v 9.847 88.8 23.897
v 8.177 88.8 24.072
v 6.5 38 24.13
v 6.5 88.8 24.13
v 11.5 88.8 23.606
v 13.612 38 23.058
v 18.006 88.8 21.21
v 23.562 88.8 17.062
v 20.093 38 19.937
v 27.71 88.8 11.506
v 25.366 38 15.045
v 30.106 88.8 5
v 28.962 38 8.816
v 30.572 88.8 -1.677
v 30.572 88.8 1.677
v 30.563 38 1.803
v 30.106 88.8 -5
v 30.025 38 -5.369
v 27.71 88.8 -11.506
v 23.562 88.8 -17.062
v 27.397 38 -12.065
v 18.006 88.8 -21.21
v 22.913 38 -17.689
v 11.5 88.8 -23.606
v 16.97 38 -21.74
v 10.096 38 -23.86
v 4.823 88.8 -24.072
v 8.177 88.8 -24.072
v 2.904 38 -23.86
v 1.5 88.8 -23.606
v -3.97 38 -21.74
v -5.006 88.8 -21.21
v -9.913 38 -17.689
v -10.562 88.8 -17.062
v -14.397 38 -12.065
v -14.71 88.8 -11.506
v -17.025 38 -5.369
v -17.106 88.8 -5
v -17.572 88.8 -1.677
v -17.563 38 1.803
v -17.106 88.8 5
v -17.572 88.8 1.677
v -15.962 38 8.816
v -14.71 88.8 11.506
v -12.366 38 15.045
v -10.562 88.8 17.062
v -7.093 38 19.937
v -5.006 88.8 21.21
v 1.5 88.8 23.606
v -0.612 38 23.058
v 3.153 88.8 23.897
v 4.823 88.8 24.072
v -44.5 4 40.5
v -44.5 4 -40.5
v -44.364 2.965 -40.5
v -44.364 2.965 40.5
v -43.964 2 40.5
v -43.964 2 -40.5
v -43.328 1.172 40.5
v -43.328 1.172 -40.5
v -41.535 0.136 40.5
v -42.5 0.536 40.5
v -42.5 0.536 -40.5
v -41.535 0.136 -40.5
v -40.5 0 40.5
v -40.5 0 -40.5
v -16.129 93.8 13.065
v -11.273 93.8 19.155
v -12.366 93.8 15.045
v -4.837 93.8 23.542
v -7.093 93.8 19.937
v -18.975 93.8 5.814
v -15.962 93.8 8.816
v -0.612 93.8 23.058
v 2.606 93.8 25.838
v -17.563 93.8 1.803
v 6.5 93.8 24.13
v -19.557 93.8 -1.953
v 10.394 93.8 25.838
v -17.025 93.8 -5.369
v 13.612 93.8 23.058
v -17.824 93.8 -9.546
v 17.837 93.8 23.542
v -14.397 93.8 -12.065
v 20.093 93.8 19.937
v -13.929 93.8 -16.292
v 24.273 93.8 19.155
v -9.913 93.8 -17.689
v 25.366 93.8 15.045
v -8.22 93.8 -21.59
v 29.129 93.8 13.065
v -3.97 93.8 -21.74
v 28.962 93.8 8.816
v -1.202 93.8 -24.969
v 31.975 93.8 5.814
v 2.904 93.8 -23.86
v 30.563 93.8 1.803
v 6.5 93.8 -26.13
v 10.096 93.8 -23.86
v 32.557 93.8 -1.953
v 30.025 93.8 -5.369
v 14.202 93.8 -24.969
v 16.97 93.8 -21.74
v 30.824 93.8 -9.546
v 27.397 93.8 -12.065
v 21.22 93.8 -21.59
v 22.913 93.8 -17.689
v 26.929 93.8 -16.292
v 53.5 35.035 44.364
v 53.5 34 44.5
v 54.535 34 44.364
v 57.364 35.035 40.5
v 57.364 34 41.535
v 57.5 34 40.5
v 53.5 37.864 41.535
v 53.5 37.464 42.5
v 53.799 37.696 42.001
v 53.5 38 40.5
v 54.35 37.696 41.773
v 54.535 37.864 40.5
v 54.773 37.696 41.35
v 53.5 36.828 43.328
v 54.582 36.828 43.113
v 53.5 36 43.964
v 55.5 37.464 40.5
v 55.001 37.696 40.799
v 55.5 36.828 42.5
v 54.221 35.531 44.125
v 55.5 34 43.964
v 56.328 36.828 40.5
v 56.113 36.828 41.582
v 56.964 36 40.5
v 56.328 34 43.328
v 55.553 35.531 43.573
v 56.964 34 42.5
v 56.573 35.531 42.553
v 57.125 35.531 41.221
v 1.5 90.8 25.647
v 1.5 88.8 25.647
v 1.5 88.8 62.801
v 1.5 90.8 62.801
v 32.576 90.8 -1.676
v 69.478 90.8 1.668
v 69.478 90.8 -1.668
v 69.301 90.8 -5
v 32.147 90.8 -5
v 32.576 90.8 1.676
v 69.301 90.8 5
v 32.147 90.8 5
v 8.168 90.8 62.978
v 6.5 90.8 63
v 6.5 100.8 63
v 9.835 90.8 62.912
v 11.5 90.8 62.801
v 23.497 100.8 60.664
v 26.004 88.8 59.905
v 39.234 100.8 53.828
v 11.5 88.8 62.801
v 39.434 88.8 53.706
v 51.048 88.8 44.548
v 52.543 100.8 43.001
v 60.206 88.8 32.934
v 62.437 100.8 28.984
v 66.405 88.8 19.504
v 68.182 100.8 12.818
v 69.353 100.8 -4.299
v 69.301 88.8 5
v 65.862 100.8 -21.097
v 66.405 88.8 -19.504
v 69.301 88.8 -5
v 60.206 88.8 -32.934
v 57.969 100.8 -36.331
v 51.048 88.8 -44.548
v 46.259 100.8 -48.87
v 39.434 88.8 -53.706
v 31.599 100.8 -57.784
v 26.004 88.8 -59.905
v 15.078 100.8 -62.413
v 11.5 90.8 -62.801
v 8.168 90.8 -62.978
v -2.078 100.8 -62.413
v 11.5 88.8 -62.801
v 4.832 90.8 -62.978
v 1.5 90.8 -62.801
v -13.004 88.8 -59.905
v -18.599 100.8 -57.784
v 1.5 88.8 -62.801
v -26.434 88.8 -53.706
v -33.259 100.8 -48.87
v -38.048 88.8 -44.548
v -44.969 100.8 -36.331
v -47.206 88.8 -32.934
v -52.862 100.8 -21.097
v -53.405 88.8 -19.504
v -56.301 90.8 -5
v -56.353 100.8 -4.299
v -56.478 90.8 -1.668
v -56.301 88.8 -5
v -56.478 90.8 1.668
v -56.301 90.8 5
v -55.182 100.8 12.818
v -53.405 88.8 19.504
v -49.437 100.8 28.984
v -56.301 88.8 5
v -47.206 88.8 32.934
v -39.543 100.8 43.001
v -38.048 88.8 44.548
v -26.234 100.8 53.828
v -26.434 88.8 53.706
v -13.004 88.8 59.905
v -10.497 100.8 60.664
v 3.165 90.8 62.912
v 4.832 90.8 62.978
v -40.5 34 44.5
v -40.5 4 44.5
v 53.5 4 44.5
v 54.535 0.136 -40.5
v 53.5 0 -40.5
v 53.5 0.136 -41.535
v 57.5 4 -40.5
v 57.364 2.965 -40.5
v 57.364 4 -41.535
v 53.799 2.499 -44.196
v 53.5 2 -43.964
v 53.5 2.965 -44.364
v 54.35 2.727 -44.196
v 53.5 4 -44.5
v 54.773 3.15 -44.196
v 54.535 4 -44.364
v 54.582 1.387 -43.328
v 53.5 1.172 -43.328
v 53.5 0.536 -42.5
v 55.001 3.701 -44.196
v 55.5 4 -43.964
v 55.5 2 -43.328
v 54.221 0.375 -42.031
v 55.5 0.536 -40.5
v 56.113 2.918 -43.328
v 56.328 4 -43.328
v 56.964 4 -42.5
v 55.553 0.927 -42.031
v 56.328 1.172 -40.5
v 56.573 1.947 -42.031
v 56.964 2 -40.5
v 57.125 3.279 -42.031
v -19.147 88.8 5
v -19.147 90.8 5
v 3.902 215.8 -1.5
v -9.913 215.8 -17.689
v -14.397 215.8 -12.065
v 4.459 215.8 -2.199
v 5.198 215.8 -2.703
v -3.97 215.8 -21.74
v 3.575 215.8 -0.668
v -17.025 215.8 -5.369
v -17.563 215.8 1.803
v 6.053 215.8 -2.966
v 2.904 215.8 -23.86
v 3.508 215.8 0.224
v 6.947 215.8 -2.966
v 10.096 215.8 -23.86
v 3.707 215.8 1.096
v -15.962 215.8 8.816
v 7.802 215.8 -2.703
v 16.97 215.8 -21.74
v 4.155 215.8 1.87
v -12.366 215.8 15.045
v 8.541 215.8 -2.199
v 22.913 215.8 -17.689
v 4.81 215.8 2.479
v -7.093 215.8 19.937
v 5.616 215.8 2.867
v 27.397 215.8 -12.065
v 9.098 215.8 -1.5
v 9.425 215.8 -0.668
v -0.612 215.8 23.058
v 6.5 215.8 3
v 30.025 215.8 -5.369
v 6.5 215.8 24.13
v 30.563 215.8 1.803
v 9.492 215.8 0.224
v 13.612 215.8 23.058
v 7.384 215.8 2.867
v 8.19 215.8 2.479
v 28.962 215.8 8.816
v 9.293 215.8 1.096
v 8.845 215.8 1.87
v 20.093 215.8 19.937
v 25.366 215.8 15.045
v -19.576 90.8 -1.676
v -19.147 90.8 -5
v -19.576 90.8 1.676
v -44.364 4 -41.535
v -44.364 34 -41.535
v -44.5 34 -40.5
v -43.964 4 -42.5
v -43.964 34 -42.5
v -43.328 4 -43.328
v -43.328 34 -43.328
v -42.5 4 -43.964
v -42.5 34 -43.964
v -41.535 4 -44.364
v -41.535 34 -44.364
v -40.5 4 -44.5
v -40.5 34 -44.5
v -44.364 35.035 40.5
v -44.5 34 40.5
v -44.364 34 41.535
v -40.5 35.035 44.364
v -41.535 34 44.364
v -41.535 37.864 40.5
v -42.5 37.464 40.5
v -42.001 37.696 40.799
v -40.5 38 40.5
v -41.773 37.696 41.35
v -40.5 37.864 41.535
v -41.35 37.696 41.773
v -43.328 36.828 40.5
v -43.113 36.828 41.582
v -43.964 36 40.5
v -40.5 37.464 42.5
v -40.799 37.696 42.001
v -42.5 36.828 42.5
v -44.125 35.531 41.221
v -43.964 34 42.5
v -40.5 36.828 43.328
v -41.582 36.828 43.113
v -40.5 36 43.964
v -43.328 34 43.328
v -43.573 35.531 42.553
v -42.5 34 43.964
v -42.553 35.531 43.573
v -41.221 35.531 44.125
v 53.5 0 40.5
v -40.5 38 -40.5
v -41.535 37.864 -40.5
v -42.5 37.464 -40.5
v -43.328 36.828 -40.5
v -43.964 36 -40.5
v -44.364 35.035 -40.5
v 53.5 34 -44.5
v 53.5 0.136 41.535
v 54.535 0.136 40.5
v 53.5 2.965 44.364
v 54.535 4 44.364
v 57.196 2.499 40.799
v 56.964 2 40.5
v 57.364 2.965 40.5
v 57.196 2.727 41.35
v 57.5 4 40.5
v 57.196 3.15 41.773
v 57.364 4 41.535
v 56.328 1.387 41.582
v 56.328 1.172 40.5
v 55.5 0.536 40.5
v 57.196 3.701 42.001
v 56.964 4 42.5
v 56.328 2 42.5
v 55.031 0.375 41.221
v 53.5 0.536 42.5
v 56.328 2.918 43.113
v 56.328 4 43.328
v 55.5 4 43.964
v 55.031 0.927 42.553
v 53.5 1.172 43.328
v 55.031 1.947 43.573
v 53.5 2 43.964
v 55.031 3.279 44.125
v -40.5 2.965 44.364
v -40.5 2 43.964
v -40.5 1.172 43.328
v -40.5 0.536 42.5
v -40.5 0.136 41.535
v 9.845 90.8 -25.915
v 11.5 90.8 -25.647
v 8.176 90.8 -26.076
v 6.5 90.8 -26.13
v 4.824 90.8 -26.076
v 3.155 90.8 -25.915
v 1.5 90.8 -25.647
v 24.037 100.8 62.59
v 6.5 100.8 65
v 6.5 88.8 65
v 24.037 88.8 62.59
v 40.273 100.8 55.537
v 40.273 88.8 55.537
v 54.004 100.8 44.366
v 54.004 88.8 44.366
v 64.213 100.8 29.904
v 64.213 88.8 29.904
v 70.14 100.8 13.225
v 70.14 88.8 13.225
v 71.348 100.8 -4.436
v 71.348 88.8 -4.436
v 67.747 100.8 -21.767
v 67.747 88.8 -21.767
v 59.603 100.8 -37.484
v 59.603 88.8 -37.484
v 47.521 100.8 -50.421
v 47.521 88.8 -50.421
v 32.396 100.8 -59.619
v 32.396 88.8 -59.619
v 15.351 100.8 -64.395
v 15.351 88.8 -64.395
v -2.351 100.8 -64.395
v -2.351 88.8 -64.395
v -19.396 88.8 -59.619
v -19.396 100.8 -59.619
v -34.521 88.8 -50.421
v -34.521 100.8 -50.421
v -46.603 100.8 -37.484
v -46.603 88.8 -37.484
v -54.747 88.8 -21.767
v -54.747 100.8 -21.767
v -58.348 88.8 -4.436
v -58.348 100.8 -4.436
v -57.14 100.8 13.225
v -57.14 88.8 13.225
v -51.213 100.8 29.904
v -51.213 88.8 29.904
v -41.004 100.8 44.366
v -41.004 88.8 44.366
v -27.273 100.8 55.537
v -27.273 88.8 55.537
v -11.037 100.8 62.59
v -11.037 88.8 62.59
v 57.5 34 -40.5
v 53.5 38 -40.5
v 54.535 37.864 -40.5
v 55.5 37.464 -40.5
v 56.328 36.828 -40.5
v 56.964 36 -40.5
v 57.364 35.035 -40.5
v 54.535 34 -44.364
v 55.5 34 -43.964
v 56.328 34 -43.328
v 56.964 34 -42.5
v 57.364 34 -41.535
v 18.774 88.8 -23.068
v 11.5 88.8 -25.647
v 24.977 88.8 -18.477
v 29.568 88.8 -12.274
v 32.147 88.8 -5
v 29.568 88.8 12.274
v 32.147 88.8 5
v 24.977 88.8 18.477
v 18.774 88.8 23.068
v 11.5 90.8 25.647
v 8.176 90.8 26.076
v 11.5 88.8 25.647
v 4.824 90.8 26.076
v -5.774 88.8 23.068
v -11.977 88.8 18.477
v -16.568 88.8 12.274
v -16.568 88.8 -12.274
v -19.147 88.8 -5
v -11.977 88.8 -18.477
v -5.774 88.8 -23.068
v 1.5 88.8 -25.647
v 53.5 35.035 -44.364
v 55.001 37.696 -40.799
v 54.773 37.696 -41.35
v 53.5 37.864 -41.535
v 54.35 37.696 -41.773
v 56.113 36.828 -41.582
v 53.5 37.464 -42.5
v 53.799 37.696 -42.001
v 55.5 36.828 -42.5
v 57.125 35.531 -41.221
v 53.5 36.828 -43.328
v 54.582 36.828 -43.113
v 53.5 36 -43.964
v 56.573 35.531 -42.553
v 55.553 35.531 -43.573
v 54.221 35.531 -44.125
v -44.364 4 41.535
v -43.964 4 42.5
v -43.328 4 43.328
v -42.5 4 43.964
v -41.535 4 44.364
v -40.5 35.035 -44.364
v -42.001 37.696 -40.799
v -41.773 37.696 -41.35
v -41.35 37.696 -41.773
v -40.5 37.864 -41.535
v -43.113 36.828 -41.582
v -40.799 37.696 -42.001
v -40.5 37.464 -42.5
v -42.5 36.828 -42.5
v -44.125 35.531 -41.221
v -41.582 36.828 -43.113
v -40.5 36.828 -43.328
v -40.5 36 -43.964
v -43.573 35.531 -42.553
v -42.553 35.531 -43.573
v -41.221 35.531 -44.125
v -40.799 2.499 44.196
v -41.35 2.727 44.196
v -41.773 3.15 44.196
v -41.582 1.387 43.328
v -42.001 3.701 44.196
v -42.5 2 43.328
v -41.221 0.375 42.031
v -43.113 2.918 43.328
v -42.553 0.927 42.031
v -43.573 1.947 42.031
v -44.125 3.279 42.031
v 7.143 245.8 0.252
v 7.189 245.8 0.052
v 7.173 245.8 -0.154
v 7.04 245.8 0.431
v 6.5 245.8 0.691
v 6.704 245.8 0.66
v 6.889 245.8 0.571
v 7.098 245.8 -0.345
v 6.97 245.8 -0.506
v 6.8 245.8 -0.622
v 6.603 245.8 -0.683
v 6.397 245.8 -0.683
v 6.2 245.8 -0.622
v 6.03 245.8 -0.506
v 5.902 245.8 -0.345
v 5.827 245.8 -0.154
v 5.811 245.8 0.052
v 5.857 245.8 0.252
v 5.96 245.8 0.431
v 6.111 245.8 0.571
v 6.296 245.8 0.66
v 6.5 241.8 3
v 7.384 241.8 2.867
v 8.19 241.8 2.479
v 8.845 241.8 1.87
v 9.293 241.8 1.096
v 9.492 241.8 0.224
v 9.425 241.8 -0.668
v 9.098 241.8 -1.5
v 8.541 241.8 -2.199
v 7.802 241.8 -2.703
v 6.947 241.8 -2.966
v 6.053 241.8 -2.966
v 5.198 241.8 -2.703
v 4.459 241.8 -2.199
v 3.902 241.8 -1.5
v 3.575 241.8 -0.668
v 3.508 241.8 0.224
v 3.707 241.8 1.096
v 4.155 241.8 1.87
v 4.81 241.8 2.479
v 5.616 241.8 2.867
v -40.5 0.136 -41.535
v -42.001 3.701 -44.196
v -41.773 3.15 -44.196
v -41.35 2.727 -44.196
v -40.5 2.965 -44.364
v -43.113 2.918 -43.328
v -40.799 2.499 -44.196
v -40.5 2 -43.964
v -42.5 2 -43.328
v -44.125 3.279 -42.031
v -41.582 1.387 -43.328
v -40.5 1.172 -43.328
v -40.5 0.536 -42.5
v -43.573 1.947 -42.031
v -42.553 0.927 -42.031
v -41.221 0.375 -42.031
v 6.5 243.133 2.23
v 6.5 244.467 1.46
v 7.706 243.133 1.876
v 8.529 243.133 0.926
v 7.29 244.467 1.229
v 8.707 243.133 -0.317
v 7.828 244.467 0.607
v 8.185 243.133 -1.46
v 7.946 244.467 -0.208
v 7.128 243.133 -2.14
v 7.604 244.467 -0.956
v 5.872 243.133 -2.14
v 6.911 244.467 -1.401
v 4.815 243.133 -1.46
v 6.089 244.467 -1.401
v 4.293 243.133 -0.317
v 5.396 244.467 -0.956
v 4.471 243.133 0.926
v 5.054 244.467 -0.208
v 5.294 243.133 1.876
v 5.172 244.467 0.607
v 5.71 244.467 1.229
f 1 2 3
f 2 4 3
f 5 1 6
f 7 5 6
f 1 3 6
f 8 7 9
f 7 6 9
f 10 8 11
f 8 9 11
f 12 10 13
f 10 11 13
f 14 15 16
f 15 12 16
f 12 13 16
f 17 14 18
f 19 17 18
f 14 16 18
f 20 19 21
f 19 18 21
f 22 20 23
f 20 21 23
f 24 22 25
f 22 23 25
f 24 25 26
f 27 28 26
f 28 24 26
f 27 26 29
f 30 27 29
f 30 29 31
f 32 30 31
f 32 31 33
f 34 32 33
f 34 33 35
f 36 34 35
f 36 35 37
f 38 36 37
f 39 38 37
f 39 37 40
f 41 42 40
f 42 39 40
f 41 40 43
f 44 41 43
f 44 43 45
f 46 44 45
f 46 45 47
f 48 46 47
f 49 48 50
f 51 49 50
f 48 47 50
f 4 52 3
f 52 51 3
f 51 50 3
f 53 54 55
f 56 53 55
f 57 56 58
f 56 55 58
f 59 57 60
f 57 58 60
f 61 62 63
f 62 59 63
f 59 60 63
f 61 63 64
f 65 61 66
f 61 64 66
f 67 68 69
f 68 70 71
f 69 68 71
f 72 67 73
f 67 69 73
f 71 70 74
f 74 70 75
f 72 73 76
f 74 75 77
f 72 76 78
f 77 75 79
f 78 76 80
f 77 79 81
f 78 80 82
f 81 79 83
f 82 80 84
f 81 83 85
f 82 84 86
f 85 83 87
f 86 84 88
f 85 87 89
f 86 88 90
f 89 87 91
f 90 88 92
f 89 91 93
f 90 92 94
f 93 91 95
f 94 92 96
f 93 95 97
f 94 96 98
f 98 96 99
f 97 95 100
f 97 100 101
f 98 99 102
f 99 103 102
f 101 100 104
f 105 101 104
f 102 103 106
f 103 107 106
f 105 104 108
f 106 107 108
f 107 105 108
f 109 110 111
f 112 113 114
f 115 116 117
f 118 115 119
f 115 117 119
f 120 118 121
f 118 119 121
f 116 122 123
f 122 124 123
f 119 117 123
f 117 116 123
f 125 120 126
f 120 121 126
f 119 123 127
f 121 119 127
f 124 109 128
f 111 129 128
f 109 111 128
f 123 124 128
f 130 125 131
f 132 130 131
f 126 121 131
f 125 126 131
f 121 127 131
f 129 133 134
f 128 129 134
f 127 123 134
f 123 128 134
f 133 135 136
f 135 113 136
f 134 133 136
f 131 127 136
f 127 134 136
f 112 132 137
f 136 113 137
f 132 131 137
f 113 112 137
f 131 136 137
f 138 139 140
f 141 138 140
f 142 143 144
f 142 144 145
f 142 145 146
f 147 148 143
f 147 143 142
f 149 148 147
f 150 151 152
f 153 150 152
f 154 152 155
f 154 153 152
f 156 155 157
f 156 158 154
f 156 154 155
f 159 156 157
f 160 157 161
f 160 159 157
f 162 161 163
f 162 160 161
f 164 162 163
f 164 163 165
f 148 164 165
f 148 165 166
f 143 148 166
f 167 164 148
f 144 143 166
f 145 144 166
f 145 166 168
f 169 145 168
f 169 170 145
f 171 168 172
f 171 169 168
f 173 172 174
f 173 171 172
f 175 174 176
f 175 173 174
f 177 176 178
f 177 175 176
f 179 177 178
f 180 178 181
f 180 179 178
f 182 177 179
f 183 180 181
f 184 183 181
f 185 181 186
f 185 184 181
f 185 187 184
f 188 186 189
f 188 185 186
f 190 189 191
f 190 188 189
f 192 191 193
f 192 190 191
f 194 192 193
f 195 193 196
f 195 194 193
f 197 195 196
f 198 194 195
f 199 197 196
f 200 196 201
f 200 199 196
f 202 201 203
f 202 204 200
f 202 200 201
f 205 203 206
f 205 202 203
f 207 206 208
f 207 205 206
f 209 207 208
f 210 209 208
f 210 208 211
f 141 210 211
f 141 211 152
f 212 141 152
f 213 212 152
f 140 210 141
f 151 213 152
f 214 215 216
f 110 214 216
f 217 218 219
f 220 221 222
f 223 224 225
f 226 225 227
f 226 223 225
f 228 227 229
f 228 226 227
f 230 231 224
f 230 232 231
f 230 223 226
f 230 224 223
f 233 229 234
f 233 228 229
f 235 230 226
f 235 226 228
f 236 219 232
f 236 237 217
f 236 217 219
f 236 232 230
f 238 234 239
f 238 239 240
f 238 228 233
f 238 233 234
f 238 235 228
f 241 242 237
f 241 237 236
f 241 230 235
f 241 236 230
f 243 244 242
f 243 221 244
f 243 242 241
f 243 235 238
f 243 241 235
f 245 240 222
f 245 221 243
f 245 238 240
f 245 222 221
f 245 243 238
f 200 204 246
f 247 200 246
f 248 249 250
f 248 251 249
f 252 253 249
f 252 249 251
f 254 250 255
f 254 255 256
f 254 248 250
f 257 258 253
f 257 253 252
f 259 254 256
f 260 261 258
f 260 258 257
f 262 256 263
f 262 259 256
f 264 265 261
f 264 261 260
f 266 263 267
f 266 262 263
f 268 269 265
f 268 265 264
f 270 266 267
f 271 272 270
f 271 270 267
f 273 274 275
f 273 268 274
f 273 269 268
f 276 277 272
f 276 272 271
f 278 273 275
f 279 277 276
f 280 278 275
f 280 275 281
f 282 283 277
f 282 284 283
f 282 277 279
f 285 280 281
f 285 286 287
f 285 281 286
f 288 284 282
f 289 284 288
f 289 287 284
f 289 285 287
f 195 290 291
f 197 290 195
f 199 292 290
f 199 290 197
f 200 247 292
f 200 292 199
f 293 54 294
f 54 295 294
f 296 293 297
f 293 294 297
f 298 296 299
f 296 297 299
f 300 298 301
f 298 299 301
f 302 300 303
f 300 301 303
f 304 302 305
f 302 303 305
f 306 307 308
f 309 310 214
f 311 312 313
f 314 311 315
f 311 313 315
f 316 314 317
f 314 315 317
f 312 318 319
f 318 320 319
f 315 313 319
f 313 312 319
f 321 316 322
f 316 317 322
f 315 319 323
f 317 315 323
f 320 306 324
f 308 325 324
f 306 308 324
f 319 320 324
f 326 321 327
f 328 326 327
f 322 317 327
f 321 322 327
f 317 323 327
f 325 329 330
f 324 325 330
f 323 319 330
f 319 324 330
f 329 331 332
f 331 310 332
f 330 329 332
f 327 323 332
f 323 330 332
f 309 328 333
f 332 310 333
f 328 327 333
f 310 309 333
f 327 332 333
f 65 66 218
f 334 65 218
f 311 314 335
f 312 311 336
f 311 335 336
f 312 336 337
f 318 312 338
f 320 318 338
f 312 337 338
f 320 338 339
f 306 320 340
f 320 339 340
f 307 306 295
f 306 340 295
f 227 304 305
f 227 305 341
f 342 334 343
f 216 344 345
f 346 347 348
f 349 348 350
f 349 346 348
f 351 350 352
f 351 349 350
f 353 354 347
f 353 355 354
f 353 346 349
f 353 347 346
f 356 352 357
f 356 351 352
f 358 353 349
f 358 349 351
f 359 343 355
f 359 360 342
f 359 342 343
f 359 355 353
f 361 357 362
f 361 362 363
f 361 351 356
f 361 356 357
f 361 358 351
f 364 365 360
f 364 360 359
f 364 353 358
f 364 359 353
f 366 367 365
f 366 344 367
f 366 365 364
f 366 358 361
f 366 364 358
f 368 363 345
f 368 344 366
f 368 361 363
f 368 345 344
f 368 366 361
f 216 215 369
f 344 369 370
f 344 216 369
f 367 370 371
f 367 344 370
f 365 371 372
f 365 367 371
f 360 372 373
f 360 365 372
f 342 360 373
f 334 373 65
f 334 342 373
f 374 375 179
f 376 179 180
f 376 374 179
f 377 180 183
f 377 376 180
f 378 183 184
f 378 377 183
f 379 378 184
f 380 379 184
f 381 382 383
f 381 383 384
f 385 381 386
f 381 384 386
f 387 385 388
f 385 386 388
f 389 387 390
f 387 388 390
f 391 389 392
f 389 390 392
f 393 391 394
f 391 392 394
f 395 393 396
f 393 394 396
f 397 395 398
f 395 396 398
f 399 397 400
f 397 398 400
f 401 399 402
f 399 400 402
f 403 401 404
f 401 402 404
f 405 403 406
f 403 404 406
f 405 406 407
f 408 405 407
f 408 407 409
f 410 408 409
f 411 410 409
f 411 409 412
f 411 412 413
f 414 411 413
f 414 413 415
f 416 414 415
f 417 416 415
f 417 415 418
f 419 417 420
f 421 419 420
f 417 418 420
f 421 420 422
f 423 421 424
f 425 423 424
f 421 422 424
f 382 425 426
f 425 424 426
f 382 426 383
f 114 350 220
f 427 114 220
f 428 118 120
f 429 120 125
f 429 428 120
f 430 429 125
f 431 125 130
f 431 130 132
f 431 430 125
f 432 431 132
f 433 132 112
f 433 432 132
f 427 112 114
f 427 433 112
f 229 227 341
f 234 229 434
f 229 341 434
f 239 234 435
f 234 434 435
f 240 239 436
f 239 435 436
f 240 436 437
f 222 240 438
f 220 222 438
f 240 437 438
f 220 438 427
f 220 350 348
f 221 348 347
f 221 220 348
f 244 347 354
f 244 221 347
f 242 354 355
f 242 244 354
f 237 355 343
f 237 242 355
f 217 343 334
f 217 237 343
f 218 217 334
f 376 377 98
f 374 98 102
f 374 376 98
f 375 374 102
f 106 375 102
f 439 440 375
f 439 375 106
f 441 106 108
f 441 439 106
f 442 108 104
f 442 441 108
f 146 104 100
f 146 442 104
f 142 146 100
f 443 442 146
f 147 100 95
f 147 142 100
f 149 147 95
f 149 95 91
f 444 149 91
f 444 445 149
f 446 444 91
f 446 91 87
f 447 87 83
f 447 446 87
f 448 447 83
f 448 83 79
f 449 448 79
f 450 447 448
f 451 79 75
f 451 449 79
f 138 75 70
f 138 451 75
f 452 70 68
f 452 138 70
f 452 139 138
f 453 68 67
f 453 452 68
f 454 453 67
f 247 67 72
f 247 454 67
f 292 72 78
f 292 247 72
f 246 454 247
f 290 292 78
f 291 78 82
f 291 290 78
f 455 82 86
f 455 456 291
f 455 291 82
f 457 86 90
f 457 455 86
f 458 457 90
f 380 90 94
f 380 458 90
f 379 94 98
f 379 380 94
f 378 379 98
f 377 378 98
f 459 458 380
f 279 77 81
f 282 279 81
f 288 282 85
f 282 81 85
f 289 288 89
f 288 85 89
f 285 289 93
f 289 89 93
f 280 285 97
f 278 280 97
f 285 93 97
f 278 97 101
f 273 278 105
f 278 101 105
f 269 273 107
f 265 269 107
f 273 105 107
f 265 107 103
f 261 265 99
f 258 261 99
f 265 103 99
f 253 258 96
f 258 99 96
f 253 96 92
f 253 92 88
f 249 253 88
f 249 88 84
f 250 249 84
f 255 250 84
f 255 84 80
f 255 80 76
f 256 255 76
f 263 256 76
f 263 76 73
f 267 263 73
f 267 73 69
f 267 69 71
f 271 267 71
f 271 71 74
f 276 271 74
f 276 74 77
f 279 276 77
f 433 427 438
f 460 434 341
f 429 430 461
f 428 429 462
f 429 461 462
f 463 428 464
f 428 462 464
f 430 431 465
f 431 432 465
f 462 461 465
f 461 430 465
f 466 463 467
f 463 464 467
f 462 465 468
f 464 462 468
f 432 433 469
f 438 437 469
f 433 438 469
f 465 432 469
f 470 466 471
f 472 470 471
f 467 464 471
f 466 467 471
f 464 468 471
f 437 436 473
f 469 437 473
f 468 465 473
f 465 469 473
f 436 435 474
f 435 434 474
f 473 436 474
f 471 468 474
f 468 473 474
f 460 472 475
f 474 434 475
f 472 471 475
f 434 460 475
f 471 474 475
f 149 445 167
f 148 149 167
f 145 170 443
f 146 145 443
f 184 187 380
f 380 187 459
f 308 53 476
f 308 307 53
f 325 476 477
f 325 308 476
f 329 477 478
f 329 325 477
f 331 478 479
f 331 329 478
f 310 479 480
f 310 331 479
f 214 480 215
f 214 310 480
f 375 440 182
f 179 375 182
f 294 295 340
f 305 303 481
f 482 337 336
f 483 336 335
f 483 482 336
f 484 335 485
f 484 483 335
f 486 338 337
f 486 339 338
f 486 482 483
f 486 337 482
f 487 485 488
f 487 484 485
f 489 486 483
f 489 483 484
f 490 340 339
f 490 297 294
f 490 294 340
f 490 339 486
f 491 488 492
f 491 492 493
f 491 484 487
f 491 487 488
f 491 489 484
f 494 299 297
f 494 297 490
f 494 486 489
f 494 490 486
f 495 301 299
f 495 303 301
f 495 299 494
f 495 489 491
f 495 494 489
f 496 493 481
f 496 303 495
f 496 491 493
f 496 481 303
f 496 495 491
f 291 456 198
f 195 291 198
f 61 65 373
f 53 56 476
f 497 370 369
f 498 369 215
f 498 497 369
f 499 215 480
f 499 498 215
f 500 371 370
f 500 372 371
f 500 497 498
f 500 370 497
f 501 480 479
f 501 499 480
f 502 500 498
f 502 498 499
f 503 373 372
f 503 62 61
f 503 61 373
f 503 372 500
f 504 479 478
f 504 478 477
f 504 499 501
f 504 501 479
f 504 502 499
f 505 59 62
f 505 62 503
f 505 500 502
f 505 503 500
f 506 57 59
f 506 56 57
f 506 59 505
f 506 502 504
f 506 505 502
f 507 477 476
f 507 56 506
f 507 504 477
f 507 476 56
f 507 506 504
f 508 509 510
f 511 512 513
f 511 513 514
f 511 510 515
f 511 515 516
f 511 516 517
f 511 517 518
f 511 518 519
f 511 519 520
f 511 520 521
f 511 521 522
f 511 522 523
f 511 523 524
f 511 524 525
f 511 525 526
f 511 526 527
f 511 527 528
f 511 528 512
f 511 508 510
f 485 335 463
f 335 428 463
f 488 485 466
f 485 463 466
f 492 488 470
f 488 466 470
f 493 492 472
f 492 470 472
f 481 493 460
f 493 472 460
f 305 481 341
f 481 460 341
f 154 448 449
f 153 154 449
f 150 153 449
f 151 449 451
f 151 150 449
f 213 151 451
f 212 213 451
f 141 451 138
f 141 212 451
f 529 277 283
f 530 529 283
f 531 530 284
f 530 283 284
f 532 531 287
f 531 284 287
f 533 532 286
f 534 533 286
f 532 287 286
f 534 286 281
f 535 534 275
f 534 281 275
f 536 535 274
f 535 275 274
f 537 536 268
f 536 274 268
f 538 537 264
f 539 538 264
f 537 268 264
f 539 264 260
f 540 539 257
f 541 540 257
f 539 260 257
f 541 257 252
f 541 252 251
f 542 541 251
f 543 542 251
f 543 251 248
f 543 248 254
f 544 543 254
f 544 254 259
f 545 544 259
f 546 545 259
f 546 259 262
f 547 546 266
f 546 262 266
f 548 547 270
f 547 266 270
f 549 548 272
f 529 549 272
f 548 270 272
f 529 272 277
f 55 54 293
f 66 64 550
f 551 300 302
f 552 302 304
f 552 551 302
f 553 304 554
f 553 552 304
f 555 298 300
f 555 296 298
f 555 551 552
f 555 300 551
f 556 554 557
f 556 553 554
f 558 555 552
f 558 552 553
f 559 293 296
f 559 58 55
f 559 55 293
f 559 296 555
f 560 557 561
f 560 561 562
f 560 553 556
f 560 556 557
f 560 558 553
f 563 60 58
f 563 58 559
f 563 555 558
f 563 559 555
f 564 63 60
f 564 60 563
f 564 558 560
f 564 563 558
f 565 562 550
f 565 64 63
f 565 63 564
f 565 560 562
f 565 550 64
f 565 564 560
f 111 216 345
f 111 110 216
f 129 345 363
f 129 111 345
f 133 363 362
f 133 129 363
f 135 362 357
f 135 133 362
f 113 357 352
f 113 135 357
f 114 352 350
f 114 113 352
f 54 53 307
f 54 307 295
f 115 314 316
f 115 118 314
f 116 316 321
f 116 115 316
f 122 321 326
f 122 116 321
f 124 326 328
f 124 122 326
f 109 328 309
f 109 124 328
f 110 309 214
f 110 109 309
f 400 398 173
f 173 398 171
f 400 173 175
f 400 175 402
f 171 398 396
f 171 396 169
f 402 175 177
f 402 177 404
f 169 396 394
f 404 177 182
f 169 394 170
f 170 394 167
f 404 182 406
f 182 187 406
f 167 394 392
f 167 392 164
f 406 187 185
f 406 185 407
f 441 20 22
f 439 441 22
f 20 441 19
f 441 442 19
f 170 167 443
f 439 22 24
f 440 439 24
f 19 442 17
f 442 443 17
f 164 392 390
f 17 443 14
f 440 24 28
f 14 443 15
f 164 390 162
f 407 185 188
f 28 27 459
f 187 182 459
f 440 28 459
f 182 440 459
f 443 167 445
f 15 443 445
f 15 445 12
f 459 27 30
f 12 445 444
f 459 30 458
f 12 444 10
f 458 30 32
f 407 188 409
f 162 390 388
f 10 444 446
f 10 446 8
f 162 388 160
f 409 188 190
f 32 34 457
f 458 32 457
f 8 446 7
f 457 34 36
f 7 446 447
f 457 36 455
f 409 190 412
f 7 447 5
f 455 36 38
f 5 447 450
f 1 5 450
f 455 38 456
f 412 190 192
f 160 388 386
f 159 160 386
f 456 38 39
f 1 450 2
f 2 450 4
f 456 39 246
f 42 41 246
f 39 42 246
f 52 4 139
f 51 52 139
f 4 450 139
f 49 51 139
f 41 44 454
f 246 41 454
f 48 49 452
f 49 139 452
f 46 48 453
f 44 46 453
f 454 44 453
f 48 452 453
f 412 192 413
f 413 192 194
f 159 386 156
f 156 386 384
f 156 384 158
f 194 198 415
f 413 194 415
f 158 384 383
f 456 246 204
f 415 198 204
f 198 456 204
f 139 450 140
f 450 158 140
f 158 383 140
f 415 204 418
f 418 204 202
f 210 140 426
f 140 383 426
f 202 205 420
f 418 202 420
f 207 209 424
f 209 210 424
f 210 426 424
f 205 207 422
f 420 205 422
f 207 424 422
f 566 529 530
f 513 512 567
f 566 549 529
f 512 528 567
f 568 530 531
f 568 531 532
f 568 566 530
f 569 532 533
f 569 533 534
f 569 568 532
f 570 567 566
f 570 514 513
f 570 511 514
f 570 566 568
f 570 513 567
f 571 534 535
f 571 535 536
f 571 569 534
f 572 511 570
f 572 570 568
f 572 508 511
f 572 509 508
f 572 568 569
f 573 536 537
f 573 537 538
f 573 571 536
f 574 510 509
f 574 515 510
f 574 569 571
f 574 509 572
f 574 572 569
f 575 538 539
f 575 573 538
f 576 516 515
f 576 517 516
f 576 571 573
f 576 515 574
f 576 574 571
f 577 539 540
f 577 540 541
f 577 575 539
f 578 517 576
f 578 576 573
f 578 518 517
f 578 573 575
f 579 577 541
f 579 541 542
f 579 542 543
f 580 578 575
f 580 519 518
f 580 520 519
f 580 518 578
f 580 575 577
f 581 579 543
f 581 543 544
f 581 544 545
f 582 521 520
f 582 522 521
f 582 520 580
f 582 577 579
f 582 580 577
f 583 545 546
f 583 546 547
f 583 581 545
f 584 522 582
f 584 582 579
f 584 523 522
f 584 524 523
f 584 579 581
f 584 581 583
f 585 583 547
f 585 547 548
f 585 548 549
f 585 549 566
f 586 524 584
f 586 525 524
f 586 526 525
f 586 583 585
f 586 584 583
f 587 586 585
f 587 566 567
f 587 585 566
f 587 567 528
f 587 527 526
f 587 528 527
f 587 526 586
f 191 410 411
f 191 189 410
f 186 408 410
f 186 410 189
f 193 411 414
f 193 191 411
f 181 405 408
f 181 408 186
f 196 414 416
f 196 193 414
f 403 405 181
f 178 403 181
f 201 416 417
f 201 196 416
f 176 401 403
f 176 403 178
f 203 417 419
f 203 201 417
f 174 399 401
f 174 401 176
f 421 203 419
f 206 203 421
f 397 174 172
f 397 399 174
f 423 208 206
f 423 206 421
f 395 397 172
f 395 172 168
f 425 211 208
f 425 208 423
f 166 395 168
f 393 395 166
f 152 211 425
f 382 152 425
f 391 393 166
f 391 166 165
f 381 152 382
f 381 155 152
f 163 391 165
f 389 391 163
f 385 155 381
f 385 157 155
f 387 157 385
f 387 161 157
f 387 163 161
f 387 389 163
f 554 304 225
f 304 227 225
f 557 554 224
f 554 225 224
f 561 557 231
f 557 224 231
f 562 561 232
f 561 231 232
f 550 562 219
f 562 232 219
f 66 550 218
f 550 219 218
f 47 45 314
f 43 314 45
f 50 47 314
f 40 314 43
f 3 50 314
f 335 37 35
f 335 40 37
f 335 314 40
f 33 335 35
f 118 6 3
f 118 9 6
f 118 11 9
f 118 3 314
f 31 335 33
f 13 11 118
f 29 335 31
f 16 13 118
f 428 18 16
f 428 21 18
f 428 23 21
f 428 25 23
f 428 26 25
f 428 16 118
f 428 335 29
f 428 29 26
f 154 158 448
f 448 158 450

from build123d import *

# Parameters (mm, degrees)
SKETCH2_W           = 102
SKETCH2_H           = 89
BOSS_EXTRUDE1_DEPTH = 38
SKETCH3_R           = 24.13
BOSS_EXTRUDE2_DEPTH = 177.8
BOSS_EXTRUDE3_START = 50.8
SKETCH4_R           = 65
SKETCH4_R_2         = 63
BOSS_EXTRUDE3_DEPTH = 12
BOSS_EXTRUDE4_DEPTH = 2
SKETCH7_R           = 26.13
SKETCH7_R_2         = 24.13
BOSS_EXTRUDE6_DEPTH = 5
SKETCH6_R           = 3
BOSS_EXTRUDE5_DEPTH = 30
CHAMFER1_SIZE       = 4
CHAMFER1_SIZE2      = 2.309401077
FILLET1_R           = 4


with BuildPart() as part:
    # Sketch2 → Boss-Extrude1 (new body)
    with BuildSketch(Plane(origin=(0, 0, 0), x_dir=(1, 0, 0), z_dir=(0, 1, 0))):
        with Locations((6.5, 0)):
            Rectangle(SKETCH2_W, SKETCH2_H)
    extrude(amount=BOSS_EXTRUDE1_DEPTH)

    # Sketch3 → Boss-Extrude2 (add)
    with BuildSketch(Plane(origin=(0, 38, 0), x_dir=(1, 0, 0), z_dir=(0, 1, 0))):
        with Locations(Location((6.5, 0, 0), (0, 0, 270))):
            Circle(SKETCH3_R)
    extrude(amount=BOSS_EXTRUDE2_DEPTH)

    # Sketch5 → Boss-Extrude4 (add)
    with BuildSketch(Plane.XZ.offset(-88.8)):
        with BuildLine():
            Line((1.5, 23.606289416), (1.5, 62.801273872))
            ThreePointArc((1.5, 62.801273872), (6.5, 63), (11.5, 62.801273872))
            Line((11.5, 62.801273872), (11.5, 23.606289416))
            ThreePointArc((11.5, 23.606289416), (6.5, 24.13), (1.5, 23.606289416))
        make_face()
        with BuildLine():
            Line((69.301273872, -5), (30.106289416, -5))
            ThreePointArc((30.106289416, -5), (30.63, 0), (30.106289416, 5))
            Line((30.106289416, 5), (69.301273872, 5))
            ThreePointArc((69.301273872, 5), (69.5, 0), (69.301273872, -5))
        make_face()
        with BuildLine():
            Line((1.5, -62.801273872), (1.5, -23.606289416))
            ThreePointArc((1.5, -23.606289416), (6.5, -24.13), (11.5, -23.606289416))
            Line((11.5, -23.606289416), (11.5, -62.801273872))
            ThreePointArc((11.5, -62.801273872), (6.5, -63), (1.5, -62.801273872))
        make_face()
        with BuildLine():
            Line((-56.301273872, 5), (-17.106289416, 5))
            ThreePointArc((-17.106289416, 5), (-17.63, 0), (-17.106289416, -5))
            Line((-17.106289416, -5), (-56.301273872, -5))
            ThreePointArc((-56.301273872, -5), (-56.5, 0), (-56.301273872, 5))
        make_face()
    extrude(amount=-BOSS_EXTRUDE4_DEPTH)


with BuildPart() as body_2:
    # Sketch4 → Boss-Extrude3 (new body)
    with BuildSketch(Plane(origin=(0, 38, 0), x_dir=(1, 0, 0), z_dir=(0, 1, 0)).offset(BOSS_EXTRUDE3_START)):
        with Locations(Location((6.5, 0, 0), (0, 0, 270))):
            Circle(SKETCH4_R)
        with Locations(Location((6.5, 0, 0), (0, 0, 270))):
            Circle(SKETCH4_R_2, mode=Mode.SUBTRACT)
    extrude(amount=BOSS_EXTRUDE3_DEPTH)


    add(part.part)  # Boss-Extrude6 merges part
    # Sketch7 → Boss-Extrude6 (add)
    with BuildSketch(Plane.XZ.offset(-88.8)):
        with Locations(Location((6.5, 0, 0), (0, 0, 270))):
            Circle(SKETCH7_R)
        with Locations(Location((6.5, 0, 0), (0, 0, 90))):
            Circle(SKETCH7_R_2, mode=Mode.SUBTRACT)
    extrude(amount=-BOSS_EXTRUDE6_DEPTH)

    # Sketch6 → Boss-Extrude5 (add)
    with BuildSketch(Plane(origin=(0, 215.8, 0), x_dir=(1, 0, 0), z_dir=(0, 1, 0))):
        with Locations(Location((6.5, 0, 0), (0, 0, 270))):
            Circle(SKETCH6_R)
    extrude(amount=BOSS_EXTRUDE5_DEPTH)

    # Chamfer1
    chamfer1_edges = [body_2.edges().sort_by_distance(p)[0] for p in [
        (6.5, 245.8, -3),
    ]]
    chamfer1_side = [body_2.faces().sort_by_distance(p)[0] for p in [
        (6.5, 230.8, -3),
    ]]
    chamfer(chamfer1_edges, length=CHAMFER1_SIZE, length2=CHAMFER1_SIZE2, reference=chamfer1_side[0])

    # Fillet1
    fillet1_edges = [body_2.edges().sort_by_distance(p)[0] for p in [
        (-44.5, 0, 0),
        (-44.5, 19, -44.5),
        (6.5, 0, 44.5),
        (-44.5, 19, 44.5),
        (57.5, 0, 0),
        (57.5, 19, 44.5),
        (6.5, 0, -44.5),
        (57.5, 19, -44.5),
        (-44.5, 38, 0),
        (6.5, 38, 44.5),
        (57.5, 38, 0),
        (6.5, 38, -44.5),
    ]]
    fillet(fillet1_edges, radius=FILLET1_R)


solid = body_2.part
